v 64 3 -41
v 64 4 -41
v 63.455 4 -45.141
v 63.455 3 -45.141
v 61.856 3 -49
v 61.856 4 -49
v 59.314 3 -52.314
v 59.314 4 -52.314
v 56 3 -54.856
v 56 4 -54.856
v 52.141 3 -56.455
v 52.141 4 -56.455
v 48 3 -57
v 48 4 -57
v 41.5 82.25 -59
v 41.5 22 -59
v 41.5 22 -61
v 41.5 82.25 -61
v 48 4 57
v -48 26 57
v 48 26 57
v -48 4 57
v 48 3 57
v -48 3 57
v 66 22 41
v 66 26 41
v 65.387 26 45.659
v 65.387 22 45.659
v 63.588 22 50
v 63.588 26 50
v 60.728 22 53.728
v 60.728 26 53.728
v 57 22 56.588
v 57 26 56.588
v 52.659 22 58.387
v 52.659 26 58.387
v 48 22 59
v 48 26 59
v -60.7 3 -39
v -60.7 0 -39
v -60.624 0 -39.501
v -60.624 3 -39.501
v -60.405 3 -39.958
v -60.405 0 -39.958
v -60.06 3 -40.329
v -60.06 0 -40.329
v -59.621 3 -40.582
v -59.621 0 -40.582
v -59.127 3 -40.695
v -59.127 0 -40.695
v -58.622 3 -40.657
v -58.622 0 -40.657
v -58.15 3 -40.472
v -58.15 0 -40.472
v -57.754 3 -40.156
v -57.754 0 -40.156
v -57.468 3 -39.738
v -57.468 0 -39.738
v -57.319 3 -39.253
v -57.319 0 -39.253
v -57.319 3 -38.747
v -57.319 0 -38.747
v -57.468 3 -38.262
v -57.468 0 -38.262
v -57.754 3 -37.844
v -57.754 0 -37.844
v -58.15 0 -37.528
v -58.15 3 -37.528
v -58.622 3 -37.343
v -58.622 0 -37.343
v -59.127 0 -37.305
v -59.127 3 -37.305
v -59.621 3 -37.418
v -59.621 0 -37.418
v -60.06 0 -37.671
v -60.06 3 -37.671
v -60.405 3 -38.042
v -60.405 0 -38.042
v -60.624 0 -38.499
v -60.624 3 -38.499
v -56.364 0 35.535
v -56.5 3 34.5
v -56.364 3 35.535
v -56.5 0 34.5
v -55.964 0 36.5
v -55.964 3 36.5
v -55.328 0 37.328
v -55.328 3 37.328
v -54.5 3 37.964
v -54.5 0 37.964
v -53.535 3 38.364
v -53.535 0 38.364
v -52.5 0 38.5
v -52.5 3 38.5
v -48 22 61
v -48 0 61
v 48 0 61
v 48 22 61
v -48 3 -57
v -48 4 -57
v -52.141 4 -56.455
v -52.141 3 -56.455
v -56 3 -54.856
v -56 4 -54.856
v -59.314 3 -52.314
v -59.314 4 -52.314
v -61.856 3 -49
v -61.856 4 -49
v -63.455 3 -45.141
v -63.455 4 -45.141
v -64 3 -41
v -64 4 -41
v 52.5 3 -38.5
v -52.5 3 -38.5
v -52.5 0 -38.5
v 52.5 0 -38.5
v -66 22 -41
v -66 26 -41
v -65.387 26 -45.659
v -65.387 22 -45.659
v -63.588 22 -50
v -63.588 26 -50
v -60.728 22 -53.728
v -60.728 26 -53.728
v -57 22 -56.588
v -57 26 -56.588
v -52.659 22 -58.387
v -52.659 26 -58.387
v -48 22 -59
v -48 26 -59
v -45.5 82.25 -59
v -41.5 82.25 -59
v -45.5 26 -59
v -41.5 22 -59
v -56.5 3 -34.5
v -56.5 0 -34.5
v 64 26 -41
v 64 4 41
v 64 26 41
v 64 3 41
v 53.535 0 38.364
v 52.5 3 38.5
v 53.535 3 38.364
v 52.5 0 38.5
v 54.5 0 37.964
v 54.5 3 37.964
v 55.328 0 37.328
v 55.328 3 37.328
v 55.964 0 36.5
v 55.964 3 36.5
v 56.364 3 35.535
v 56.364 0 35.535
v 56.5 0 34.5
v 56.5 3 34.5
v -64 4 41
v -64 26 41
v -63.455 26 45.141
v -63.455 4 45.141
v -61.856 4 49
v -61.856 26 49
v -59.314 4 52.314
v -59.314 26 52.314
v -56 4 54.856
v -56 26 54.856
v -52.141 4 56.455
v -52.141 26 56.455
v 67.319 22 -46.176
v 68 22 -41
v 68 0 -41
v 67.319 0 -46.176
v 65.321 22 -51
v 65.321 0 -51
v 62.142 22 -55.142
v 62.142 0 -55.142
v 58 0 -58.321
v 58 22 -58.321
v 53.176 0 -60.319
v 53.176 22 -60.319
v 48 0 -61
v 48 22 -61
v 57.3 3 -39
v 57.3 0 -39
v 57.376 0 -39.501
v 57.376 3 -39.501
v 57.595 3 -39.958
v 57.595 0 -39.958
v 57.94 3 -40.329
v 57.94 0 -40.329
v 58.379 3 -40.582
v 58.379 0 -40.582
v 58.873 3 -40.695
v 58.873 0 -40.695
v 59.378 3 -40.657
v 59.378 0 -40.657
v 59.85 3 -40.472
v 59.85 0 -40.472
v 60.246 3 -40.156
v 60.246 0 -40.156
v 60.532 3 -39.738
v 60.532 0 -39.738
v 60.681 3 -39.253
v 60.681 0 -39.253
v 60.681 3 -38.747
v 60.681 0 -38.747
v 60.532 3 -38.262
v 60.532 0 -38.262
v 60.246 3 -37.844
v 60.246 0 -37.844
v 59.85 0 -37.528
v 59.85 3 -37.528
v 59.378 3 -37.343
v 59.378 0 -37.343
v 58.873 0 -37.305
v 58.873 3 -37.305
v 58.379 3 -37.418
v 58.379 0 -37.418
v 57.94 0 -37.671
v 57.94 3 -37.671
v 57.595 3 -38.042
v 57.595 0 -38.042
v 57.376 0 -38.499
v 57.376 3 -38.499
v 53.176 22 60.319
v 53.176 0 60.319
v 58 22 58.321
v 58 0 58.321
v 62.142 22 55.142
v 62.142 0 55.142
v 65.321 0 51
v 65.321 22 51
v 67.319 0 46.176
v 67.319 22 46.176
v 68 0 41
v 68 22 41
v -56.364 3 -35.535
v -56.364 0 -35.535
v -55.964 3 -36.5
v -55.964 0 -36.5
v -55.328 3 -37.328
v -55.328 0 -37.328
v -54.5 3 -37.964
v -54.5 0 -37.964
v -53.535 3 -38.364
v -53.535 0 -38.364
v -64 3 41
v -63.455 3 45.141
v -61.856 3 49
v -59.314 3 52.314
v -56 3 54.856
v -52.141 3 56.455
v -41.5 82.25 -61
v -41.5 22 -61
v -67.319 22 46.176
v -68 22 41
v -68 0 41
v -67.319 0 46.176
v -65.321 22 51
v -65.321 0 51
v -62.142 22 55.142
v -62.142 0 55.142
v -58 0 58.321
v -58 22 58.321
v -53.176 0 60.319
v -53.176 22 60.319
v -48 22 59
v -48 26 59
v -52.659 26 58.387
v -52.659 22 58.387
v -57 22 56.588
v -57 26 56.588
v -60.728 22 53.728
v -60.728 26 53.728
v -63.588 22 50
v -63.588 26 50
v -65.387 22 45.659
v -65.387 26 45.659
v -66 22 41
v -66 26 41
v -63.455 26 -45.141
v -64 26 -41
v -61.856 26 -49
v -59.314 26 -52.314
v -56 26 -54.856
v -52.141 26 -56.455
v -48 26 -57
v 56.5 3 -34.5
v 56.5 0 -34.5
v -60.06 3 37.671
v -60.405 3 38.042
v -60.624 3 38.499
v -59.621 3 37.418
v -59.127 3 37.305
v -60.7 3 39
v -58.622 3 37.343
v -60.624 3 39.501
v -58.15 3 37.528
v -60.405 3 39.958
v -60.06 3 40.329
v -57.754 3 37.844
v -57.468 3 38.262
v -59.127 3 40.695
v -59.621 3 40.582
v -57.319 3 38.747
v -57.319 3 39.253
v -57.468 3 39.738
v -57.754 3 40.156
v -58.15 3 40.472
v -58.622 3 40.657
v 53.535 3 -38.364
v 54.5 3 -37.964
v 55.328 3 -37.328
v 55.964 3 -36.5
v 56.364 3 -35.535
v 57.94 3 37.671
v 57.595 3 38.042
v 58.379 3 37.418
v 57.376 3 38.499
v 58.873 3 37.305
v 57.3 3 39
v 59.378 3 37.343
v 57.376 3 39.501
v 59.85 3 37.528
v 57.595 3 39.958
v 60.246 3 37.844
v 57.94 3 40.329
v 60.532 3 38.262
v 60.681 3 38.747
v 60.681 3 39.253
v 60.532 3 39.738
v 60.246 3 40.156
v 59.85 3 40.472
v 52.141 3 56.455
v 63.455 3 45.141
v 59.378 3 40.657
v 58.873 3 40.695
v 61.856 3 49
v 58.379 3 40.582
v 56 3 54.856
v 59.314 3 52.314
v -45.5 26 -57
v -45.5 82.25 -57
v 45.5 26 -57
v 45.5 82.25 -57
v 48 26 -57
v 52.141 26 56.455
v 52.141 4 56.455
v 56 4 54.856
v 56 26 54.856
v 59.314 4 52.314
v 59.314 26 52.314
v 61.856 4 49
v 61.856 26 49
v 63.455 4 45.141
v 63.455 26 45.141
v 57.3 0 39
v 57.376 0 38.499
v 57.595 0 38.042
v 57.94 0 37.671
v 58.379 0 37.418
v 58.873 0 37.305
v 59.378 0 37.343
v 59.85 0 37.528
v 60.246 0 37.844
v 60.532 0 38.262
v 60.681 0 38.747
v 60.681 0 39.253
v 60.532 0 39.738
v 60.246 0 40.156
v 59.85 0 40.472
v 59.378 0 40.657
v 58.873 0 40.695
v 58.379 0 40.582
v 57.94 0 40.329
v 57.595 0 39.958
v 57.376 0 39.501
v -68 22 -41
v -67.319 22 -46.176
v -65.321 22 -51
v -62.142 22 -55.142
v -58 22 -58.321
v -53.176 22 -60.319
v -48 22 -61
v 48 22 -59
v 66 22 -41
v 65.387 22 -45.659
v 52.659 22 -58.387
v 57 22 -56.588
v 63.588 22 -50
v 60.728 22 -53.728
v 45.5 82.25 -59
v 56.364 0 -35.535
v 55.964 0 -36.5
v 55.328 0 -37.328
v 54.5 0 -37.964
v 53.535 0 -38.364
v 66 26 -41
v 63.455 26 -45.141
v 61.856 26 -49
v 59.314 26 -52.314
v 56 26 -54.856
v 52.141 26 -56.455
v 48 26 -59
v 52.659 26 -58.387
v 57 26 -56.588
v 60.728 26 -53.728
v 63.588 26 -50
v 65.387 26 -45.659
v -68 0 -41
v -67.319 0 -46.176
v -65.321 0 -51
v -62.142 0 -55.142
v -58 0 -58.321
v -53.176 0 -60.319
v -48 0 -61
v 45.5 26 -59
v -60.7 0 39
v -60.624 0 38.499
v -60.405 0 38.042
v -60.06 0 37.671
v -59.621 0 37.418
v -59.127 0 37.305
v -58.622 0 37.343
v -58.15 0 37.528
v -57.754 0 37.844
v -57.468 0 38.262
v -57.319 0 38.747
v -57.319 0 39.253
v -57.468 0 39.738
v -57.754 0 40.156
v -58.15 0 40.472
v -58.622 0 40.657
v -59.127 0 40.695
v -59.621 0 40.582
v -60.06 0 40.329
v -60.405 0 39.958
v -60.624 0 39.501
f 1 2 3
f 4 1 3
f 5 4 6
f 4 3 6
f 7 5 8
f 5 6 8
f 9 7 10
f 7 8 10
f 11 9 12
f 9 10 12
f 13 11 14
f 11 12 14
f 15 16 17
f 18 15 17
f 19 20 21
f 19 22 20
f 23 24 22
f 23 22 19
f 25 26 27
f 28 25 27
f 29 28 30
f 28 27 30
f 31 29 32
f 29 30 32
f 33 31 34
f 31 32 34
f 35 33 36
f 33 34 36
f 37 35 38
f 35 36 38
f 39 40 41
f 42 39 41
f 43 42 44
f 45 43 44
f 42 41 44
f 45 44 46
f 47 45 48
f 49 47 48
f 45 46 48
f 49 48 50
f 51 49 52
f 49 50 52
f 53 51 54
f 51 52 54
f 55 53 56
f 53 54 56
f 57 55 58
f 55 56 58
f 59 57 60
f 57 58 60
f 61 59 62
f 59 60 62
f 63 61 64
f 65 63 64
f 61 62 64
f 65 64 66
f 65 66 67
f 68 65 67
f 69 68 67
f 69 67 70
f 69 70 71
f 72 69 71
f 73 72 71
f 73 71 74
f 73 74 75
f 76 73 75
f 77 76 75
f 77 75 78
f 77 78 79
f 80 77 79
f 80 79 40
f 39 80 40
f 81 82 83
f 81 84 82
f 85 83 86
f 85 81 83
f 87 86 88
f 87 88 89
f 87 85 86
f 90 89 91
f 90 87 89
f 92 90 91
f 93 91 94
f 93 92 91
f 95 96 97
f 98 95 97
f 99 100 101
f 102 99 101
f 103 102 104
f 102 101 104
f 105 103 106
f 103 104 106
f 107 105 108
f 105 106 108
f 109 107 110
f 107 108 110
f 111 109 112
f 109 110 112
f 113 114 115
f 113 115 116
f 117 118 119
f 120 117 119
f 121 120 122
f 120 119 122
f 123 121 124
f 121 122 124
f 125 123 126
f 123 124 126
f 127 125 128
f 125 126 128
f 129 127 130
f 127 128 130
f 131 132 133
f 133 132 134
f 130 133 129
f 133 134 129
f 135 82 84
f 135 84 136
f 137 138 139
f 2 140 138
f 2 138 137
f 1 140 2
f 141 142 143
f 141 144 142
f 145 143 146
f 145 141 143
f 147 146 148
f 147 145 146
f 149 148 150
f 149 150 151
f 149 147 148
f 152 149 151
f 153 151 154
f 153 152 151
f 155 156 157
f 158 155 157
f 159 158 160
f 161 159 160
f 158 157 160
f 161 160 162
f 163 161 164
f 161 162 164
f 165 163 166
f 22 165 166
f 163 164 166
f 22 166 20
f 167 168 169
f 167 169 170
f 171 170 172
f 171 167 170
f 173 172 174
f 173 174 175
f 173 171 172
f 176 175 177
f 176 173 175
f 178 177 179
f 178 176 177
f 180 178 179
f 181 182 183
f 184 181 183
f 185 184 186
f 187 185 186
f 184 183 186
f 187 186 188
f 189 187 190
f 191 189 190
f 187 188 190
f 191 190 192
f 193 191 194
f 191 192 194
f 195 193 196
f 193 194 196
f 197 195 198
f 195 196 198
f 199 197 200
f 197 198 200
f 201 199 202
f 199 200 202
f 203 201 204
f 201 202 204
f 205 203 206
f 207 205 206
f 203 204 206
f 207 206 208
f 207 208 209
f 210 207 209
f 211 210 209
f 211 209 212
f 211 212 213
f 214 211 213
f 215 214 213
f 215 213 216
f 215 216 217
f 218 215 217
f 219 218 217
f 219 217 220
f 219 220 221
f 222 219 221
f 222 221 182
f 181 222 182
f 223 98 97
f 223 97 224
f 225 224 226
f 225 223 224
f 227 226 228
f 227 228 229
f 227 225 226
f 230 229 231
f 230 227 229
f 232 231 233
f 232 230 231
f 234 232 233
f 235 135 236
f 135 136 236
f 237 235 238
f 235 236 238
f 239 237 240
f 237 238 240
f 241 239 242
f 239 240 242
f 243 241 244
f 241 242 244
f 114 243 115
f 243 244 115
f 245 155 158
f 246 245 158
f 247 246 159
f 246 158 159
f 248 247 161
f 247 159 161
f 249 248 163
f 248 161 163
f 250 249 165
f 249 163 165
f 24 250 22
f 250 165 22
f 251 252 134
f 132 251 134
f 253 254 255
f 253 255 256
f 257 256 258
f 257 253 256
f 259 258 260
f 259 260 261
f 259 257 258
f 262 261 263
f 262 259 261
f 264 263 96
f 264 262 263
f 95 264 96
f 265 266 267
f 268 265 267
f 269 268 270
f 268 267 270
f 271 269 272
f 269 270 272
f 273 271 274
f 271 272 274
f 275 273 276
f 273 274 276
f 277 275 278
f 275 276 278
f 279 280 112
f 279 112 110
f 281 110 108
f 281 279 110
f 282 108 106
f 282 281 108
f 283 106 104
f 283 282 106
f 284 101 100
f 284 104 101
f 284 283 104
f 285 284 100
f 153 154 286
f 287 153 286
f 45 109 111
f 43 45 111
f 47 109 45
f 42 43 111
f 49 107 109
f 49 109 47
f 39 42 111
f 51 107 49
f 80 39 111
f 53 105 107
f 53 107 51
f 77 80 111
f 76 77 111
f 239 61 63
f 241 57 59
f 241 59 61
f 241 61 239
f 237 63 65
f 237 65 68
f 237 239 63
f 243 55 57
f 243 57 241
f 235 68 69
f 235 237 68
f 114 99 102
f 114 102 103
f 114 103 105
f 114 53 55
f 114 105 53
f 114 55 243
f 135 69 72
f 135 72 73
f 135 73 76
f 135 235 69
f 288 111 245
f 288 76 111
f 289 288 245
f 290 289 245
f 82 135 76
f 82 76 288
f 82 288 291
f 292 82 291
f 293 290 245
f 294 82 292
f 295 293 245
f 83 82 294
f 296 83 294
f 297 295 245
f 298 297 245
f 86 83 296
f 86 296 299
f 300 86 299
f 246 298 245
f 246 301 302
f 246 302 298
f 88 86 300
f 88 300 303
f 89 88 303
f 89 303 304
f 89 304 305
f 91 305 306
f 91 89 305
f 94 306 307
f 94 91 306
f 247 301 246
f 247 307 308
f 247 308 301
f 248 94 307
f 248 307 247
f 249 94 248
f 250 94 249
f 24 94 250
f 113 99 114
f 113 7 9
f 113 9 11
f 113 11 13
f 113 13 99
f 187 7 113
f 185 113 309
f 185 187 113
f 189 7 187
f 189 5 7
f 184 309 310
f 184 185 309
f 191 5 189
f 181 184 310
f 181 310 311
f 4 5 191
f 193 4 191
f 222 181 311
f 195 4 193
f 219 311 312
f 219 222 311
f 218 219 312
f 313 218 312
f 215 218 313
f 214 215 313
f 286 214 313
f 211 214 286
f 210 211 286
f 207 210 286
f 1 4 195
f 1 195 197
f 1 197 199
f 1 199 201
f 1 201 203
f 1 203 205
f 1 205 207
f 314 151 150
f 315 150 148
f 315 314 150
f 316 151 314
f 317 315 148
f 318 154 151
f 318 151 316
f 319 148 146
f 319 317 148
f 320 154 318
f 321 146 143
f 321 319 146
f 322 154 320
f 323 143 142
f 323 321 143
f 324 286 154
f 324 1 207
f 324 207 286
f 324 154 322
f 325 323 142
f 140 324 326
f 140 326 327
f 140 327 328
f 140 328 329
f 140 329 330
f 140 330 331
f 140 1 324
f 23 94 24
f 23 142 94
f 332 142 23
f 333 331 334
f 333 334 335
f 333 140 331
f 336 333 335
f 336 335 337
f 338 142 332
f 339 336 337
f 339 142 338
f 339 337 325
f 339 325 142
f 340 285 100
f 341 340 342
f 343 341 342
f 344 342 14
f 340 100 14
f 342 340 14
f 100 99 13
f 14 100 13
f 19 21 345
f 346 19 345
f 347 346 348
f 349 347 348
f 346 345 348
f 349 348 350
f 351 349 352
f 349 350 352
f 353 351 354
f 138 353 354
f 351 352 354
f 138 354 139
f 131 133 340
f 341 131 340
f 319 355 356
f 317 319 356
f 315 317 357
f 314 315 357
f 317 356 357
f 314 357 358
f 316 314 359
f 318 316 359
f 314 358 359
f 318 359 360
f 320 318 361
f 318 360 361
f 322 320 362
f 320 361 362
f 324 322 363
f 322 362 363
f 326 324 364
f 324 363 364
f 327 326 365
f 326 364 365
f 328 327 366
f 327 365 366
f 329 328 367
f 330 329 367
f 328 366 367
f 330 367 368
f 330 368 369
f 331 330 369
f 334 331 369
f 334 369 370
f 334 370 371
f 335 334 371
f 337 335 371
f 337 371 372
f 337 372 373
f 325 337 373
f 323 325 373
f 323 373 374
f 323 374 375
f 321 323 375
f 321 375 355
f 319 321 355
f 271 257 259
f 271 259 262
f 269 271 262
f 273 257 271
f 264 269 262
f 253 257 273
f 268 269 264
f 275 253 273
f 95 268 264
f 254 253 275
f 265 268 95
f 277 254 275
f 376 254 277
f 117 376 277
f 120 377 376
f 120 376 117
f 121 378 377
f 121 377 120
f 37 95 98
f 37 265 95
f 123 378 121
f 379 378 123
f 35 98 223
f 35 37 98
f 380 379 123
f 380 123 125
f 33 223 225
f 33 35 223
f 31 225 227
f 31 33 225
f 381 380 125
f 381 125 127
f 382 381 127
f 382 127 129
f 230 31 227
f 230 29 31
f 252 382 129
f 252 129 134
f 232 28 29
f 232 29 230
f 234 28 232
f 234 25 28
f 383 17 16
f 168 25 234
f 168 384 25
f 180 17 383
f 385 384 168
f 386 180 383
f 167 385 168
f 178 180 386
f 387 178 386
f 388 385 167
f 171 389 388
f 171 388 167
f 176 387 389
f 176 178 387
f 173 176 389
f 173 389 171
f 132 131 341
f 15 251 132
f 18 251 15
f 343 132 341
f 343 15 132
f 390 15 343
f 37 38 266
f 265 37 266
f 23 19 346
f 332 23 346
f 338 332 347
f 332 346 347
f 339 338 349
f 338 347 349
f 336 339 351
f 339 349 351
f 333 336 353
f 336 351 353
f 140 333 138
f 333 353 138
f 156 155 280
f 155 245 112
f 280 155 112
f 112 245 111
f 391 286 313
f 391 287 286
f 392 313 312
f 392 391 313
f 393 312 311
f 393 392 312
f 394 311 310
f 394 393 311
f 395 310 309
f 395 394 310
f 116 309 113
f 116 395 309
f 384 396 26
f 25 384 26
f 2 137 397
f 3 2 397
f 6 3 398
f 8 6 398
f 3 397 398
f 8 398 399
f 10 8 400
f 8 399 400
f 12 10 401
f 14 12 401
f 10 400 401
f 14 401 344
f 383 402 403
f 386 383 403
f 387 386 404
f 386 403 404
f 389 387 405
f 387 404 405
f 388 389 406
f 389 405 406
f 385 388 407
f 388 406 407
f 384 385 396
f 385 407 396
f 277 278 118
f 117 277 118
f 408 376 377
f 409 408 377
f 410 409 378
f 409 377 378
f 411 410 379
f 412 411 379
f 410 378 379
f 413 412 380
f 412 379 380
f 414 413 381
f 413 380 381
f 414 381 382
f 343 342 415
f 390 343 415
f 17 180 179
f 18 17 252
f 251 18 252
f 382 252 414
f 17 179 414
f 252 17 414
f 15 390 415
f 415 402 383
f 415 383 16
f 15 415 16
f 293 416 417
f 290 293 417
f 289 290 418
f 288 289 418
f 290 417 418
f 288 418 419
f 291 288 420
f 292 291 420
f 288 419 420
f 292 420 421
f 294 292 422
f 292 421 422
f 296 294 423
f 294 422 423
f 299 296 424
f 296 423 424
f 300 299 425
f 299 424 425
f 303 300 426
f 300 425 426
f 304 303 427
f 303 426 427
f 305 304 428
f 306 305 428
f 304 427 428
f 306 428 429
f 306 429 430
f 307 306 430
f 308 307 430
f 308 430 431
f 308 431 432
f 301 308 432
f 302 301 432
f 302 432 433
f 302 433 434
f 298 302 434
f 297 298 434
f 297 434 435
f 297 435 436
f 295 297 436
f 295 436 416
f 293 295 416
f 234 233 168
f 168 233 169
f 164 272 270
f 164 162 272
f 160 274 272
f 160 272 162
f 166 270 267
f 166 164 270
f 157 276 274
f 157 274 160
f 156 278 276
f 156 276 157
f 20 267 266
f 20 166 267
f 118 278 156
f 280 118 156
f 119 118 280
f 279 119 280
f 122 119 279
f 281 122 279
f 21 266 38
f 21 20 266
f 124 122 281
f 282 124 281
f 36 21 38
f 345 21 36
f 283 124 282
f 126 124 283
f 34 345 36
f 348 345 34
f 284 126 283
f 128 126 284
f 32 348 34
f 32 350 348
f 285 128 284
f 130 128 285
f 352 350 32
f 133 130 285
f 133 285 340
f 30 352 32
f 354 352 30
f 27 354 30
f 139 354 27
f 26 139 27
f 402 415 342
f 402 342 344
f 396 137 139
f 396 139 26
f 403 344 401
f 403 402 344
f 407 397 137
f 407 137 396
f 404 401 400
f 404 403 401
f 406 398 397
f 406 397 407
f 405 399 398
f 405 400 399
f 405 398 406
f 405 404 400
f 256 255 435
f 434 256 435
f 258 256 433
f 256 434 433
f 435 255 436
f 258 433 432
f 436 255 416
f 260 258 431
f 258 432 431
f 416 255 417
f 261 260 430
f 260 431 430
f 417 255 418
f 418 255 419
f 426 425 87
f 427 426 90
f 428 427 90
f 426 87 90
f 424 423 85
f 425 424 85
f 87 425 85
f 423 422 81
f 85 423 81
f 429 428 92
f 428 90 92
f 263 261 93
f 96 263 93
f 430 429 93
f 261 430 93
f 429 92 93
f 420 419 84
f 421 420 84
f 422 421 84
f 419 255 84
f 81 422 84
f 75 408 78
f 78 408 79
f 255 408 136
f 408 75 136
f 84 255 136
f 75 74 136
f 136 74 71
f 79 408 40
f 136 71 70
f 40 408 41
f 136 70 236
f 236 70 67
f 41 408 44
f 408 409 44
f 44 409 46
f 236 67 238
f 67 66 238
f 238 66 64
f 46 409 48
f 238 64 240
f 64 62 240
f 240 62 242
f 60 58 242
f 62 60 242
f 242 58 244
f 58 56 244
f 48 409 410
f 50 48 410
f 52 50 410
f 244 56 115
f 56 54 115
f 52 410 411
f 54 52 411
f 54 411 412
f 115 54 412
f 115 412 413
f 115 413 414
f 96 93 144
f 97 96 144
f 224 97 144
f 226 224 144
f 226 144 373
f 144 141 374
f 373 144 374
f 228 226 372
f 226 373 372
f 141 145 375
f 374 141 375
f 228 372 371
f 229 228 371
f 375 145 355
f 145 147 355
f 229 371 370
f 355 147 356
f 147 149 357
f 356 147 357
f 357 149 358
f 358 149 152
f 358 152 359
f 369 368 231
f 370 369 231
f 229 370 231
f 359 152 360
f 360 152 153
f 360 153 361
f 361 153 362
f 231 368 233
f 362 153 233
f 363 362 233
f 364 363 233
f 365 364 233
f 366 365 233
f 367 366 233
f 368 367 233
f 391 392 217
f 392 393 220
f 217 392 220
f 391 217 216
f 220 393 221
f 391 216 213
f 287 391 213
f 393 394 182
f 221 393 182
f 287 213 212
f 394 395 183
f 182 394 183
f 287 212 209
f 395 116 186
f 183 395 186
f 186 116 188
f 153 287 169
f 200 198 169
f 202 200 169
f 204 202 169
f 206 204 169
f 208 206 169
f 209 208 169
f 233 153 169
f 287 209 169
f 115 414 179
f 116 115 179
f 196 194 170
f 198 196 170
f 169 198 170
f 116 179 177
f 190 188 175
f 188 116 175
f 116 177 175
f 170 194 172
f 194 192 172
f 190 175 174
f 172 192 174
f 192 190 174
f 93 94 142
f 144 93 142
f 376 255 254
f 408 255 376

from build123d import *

# Parameters (mm, degrees)
SKETCH1_W                = 136
SKETCH1_H                = 122
BOSS_EXTRUDE1_DEPTH      = 26
FILLET1_R                = 20
SHELL1_T                 = -4
SHELL1_THICKNESS_2_DEPTH = 1
CUT_EXTRUDE1_REACH       = 96.202
SKETCH2_W                = 113
SKETCH2_H                = 77
FILLET2_R                = 4
M3_CLEARANCE_HOLE1_D     = 3.4
CUT_EXTRUDE2_DEPTH       = 4
BOSS_EXTRUDE3_DEPTH      = 56.25


with BuildPart() as part:
    # Sketch1 → Boss-Extrude1 (new body)
    with BuildSketch(Plane(origin=(0, 0, 0), x_dir=(1, 0, 0), z_dir=(0, 1, 0))):
        Rectangle(SKETCH1_W, SKETCH1_H)
    extrude(amount=BOSS_EXTRUDE1_DEPTH)

    # Fillet1
    fillet1_edges = [part.edges().sort_by_distance(p)[0] for p in [
        (68, 13, 61),
        (-68, 13, 61),
        (-68, 13, -61),
        (68, 13, -61),
    ]]
    fillet(fillet1_edges, radius=FILLET1_R)

    # Shell1
    shell1_openings = [part.faces().sort_by_distance(p)[0] for p in [
        (0, 26, 0),
    ]]
    offset(amount=SHELL1_T, openings=shell1_openings, kind=Kind.INTERSECTION)

    # Shell1 thickness 2 face (on inner face of the shell) → Shell1 thickness 2 (cut)
    with BuildSketch(Plane(origin=(0, 4, 0), x_dir=(0, 0, -1), z_dir=(0, -1, 0))):
        with BuildLine():
            ThreePointArc((57, -48), (52.313708499, -59.313708499), (41, -64))
            Line((41, -64), (-41, -64))
            ThreePointArc((-41, -64), (-52.313708499, -59.313708499), (-57, -48))
            Line((-57, -48), (-57, 48))
            ThreePointArc((-57, 48), (-52.313708499, 59.313708499), (-41, 64))
            Line((-41, 64), (41, 64))
            ThreePointArc((41, 64), (52.313708499, 59.313708499), (57, 48))
            Line((57, 48), (57, -48))
        make_face()
    extrude(amount=SHELL1_THICKNESS_2_DEPTH, mode=Mode.SUBTRACT)

    # Sketch2 → Cut-Extrude1 (cut, up to next)
    with BuildSketch(Plane(origin=(0, 3, 0), x_dir=(1, 0, 0), z_dir=(0, 1, 0)), mode=Mode.PRIVATE) as cut_extrude1_sk1:
        Rectangle(SKETCH2_W, SKETCH2_H)
    cut_extrude1_tool1 = extrude(cut_extrude1_sk1.sketch, amount=-CUT_EXTRUDE1_REACH, mode=Mode.PRIVATE) & part.part
    add(cut_extrude1_tool1.solids().sort_by_distance((0, 3, 0))[0], mode=Mode.SUBTRACT)

    # Fillet2
    fillet2_edges = [part.edges().sort_by_distance(p)[0] for p in [
        (56.5, 1.5, -38.5),
        (56.5, 1.5, 38.5),
        (-56.5, 1.5, 38.5),
        (-56.5, 1.5, -38.5),
    ]]
    fillet(fillet2_edges, radius=FILLET2_R)

    # M3 Clearance Hole1 (through all)
    with Locations(Plane(origin=(0, 3, 0), x_dir=(1, 0, 0), z_dir=(0, 1, 0))):
        with Locations((-59, 39), (59, 39), (59, -39), (-59, -39)):
            Hole(M3_CLEARANCE_HOLE1_D / 2)

    # Sketch5 → Cut-Extrude2 (cut)
    with BuildSketch(Plane(origin=(0, 26, 0), x_dir=(1, 0, 0), z_dir=(0, 1, 0))):
        with BuildLine():
            Line((-68, 41), (-68, -41))
            ThreePointArc((-68, -41), (-62.142135624, -55.142135624), (-48, -61))
            Line((-48, -61), (48, -61))
            ThreePointArc((48, -61), (62.142135624, -55.142135624), (68, -41))
            Line((68, -41), (68, 41))
            ThreePointArc((68, 41), (62.142135624, 55.142135624), (48, 61))
            Line((48, 61), (41.5, 61))
            Line((41.5, 61), (41.5, 59))
            Line((41.5, 59), (48, 59))
            ThreePointArc((48, 59), (60.727922061, 53.727922061), (66, 41))
            Line((66, 41), (66, -41))
            ThreePointArc((66, -41), (60.727922061, -53.727922061), (48, -59))
            Line((48, -59), (-48, -59))
            ThreePointArc((-48, -59), (-60.727922061, -53.727922061), (-66, -41))
            Line((-66, -41), (-66, 41))
            ThreePointArc((-66, 41), (-60.727922061, 53.727922061), (-48, 59))
            Line((-48, 59), (-41.5, 59))
            Line((-41.5, 59), (-41.5, 61))
            Line((-41.5, 61), (-48, 61))
            ThreePointArc((-48, 61), (-62.142135624, 55.142135624), (-68, 41))
        make_face()
    extrude(amount=-CUT_EXTRUDE2_DEPTH, mode=Mode.SUBTRACT)

    # Sketch9 → Boss-Extrude3 (add)
    with BuildSketch(Plane(origin=(0, 26, 0), x_dir=(1, 0, 0), z_dir=(0, 1, 0))):
        Polygon((-41.5, 61), (-41.5, 59), (-45.5, 59), (-45.5, 57), (45.5, 57), (45.5, 59), (41.5, 59), (41.5, 61), align=None)
    extrude(amount=BOSS_EXTRUDE3_DEPTH)


solid = part.part
